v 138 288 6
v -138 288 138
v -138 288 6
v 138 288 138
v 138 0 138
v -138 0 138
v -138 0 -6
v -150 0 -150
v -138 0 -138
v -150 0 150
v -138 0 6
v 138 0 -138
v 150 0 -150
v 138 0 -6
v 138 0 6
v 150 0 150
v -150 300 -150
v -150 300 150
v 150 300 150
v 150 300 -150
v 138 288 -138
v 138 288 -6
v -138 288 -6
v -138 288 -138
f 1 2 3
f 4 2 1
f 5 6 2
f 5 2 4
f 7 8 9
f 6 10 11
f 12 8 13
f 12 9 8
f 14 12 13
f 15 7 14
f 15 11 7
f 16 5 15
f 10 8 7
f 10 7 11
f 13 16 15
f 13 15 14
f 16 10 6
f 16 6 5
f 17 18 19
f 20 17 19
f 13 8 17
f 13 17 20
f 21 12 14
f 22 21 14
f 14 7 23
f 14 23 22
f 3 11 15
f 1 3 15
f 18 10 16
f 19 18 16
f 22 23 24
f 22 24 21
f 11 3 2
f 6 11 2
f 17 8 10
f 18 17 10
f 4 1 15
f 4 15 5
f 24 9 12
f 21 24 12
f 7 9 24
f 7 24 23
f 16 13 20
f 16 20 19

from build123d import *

# Parameters (mm, degrees)
F0_W     = 300
F0_H     = 300
F1_DEPTH = 300
F2_T     = -12
F3_W     = 276
F3_H     = 12
F4_DEPTH = 295


with BuildPart() as f1:
    # F0 (on Front) → F1 (new body)
    with BuildSketch(Plane.XZ):
        Rectangle(F0_W, F0_H)
    extrude(amount=-F1_DEPTH)

    # F2
    f2_openings = [f1.faces().sort_by_distance(p)[0] for p in [
        (0, 0, 0),
    ]]
    offset(amount=F2_T, openings=f2_openings)

    # F3 (on face) → F4 (join)
    with BuildSketch(Plane.XZ):
        Rectangle(F3_W, F3_H)
    extrude(amount=-F4_DEPTH)


solid = f1.part
